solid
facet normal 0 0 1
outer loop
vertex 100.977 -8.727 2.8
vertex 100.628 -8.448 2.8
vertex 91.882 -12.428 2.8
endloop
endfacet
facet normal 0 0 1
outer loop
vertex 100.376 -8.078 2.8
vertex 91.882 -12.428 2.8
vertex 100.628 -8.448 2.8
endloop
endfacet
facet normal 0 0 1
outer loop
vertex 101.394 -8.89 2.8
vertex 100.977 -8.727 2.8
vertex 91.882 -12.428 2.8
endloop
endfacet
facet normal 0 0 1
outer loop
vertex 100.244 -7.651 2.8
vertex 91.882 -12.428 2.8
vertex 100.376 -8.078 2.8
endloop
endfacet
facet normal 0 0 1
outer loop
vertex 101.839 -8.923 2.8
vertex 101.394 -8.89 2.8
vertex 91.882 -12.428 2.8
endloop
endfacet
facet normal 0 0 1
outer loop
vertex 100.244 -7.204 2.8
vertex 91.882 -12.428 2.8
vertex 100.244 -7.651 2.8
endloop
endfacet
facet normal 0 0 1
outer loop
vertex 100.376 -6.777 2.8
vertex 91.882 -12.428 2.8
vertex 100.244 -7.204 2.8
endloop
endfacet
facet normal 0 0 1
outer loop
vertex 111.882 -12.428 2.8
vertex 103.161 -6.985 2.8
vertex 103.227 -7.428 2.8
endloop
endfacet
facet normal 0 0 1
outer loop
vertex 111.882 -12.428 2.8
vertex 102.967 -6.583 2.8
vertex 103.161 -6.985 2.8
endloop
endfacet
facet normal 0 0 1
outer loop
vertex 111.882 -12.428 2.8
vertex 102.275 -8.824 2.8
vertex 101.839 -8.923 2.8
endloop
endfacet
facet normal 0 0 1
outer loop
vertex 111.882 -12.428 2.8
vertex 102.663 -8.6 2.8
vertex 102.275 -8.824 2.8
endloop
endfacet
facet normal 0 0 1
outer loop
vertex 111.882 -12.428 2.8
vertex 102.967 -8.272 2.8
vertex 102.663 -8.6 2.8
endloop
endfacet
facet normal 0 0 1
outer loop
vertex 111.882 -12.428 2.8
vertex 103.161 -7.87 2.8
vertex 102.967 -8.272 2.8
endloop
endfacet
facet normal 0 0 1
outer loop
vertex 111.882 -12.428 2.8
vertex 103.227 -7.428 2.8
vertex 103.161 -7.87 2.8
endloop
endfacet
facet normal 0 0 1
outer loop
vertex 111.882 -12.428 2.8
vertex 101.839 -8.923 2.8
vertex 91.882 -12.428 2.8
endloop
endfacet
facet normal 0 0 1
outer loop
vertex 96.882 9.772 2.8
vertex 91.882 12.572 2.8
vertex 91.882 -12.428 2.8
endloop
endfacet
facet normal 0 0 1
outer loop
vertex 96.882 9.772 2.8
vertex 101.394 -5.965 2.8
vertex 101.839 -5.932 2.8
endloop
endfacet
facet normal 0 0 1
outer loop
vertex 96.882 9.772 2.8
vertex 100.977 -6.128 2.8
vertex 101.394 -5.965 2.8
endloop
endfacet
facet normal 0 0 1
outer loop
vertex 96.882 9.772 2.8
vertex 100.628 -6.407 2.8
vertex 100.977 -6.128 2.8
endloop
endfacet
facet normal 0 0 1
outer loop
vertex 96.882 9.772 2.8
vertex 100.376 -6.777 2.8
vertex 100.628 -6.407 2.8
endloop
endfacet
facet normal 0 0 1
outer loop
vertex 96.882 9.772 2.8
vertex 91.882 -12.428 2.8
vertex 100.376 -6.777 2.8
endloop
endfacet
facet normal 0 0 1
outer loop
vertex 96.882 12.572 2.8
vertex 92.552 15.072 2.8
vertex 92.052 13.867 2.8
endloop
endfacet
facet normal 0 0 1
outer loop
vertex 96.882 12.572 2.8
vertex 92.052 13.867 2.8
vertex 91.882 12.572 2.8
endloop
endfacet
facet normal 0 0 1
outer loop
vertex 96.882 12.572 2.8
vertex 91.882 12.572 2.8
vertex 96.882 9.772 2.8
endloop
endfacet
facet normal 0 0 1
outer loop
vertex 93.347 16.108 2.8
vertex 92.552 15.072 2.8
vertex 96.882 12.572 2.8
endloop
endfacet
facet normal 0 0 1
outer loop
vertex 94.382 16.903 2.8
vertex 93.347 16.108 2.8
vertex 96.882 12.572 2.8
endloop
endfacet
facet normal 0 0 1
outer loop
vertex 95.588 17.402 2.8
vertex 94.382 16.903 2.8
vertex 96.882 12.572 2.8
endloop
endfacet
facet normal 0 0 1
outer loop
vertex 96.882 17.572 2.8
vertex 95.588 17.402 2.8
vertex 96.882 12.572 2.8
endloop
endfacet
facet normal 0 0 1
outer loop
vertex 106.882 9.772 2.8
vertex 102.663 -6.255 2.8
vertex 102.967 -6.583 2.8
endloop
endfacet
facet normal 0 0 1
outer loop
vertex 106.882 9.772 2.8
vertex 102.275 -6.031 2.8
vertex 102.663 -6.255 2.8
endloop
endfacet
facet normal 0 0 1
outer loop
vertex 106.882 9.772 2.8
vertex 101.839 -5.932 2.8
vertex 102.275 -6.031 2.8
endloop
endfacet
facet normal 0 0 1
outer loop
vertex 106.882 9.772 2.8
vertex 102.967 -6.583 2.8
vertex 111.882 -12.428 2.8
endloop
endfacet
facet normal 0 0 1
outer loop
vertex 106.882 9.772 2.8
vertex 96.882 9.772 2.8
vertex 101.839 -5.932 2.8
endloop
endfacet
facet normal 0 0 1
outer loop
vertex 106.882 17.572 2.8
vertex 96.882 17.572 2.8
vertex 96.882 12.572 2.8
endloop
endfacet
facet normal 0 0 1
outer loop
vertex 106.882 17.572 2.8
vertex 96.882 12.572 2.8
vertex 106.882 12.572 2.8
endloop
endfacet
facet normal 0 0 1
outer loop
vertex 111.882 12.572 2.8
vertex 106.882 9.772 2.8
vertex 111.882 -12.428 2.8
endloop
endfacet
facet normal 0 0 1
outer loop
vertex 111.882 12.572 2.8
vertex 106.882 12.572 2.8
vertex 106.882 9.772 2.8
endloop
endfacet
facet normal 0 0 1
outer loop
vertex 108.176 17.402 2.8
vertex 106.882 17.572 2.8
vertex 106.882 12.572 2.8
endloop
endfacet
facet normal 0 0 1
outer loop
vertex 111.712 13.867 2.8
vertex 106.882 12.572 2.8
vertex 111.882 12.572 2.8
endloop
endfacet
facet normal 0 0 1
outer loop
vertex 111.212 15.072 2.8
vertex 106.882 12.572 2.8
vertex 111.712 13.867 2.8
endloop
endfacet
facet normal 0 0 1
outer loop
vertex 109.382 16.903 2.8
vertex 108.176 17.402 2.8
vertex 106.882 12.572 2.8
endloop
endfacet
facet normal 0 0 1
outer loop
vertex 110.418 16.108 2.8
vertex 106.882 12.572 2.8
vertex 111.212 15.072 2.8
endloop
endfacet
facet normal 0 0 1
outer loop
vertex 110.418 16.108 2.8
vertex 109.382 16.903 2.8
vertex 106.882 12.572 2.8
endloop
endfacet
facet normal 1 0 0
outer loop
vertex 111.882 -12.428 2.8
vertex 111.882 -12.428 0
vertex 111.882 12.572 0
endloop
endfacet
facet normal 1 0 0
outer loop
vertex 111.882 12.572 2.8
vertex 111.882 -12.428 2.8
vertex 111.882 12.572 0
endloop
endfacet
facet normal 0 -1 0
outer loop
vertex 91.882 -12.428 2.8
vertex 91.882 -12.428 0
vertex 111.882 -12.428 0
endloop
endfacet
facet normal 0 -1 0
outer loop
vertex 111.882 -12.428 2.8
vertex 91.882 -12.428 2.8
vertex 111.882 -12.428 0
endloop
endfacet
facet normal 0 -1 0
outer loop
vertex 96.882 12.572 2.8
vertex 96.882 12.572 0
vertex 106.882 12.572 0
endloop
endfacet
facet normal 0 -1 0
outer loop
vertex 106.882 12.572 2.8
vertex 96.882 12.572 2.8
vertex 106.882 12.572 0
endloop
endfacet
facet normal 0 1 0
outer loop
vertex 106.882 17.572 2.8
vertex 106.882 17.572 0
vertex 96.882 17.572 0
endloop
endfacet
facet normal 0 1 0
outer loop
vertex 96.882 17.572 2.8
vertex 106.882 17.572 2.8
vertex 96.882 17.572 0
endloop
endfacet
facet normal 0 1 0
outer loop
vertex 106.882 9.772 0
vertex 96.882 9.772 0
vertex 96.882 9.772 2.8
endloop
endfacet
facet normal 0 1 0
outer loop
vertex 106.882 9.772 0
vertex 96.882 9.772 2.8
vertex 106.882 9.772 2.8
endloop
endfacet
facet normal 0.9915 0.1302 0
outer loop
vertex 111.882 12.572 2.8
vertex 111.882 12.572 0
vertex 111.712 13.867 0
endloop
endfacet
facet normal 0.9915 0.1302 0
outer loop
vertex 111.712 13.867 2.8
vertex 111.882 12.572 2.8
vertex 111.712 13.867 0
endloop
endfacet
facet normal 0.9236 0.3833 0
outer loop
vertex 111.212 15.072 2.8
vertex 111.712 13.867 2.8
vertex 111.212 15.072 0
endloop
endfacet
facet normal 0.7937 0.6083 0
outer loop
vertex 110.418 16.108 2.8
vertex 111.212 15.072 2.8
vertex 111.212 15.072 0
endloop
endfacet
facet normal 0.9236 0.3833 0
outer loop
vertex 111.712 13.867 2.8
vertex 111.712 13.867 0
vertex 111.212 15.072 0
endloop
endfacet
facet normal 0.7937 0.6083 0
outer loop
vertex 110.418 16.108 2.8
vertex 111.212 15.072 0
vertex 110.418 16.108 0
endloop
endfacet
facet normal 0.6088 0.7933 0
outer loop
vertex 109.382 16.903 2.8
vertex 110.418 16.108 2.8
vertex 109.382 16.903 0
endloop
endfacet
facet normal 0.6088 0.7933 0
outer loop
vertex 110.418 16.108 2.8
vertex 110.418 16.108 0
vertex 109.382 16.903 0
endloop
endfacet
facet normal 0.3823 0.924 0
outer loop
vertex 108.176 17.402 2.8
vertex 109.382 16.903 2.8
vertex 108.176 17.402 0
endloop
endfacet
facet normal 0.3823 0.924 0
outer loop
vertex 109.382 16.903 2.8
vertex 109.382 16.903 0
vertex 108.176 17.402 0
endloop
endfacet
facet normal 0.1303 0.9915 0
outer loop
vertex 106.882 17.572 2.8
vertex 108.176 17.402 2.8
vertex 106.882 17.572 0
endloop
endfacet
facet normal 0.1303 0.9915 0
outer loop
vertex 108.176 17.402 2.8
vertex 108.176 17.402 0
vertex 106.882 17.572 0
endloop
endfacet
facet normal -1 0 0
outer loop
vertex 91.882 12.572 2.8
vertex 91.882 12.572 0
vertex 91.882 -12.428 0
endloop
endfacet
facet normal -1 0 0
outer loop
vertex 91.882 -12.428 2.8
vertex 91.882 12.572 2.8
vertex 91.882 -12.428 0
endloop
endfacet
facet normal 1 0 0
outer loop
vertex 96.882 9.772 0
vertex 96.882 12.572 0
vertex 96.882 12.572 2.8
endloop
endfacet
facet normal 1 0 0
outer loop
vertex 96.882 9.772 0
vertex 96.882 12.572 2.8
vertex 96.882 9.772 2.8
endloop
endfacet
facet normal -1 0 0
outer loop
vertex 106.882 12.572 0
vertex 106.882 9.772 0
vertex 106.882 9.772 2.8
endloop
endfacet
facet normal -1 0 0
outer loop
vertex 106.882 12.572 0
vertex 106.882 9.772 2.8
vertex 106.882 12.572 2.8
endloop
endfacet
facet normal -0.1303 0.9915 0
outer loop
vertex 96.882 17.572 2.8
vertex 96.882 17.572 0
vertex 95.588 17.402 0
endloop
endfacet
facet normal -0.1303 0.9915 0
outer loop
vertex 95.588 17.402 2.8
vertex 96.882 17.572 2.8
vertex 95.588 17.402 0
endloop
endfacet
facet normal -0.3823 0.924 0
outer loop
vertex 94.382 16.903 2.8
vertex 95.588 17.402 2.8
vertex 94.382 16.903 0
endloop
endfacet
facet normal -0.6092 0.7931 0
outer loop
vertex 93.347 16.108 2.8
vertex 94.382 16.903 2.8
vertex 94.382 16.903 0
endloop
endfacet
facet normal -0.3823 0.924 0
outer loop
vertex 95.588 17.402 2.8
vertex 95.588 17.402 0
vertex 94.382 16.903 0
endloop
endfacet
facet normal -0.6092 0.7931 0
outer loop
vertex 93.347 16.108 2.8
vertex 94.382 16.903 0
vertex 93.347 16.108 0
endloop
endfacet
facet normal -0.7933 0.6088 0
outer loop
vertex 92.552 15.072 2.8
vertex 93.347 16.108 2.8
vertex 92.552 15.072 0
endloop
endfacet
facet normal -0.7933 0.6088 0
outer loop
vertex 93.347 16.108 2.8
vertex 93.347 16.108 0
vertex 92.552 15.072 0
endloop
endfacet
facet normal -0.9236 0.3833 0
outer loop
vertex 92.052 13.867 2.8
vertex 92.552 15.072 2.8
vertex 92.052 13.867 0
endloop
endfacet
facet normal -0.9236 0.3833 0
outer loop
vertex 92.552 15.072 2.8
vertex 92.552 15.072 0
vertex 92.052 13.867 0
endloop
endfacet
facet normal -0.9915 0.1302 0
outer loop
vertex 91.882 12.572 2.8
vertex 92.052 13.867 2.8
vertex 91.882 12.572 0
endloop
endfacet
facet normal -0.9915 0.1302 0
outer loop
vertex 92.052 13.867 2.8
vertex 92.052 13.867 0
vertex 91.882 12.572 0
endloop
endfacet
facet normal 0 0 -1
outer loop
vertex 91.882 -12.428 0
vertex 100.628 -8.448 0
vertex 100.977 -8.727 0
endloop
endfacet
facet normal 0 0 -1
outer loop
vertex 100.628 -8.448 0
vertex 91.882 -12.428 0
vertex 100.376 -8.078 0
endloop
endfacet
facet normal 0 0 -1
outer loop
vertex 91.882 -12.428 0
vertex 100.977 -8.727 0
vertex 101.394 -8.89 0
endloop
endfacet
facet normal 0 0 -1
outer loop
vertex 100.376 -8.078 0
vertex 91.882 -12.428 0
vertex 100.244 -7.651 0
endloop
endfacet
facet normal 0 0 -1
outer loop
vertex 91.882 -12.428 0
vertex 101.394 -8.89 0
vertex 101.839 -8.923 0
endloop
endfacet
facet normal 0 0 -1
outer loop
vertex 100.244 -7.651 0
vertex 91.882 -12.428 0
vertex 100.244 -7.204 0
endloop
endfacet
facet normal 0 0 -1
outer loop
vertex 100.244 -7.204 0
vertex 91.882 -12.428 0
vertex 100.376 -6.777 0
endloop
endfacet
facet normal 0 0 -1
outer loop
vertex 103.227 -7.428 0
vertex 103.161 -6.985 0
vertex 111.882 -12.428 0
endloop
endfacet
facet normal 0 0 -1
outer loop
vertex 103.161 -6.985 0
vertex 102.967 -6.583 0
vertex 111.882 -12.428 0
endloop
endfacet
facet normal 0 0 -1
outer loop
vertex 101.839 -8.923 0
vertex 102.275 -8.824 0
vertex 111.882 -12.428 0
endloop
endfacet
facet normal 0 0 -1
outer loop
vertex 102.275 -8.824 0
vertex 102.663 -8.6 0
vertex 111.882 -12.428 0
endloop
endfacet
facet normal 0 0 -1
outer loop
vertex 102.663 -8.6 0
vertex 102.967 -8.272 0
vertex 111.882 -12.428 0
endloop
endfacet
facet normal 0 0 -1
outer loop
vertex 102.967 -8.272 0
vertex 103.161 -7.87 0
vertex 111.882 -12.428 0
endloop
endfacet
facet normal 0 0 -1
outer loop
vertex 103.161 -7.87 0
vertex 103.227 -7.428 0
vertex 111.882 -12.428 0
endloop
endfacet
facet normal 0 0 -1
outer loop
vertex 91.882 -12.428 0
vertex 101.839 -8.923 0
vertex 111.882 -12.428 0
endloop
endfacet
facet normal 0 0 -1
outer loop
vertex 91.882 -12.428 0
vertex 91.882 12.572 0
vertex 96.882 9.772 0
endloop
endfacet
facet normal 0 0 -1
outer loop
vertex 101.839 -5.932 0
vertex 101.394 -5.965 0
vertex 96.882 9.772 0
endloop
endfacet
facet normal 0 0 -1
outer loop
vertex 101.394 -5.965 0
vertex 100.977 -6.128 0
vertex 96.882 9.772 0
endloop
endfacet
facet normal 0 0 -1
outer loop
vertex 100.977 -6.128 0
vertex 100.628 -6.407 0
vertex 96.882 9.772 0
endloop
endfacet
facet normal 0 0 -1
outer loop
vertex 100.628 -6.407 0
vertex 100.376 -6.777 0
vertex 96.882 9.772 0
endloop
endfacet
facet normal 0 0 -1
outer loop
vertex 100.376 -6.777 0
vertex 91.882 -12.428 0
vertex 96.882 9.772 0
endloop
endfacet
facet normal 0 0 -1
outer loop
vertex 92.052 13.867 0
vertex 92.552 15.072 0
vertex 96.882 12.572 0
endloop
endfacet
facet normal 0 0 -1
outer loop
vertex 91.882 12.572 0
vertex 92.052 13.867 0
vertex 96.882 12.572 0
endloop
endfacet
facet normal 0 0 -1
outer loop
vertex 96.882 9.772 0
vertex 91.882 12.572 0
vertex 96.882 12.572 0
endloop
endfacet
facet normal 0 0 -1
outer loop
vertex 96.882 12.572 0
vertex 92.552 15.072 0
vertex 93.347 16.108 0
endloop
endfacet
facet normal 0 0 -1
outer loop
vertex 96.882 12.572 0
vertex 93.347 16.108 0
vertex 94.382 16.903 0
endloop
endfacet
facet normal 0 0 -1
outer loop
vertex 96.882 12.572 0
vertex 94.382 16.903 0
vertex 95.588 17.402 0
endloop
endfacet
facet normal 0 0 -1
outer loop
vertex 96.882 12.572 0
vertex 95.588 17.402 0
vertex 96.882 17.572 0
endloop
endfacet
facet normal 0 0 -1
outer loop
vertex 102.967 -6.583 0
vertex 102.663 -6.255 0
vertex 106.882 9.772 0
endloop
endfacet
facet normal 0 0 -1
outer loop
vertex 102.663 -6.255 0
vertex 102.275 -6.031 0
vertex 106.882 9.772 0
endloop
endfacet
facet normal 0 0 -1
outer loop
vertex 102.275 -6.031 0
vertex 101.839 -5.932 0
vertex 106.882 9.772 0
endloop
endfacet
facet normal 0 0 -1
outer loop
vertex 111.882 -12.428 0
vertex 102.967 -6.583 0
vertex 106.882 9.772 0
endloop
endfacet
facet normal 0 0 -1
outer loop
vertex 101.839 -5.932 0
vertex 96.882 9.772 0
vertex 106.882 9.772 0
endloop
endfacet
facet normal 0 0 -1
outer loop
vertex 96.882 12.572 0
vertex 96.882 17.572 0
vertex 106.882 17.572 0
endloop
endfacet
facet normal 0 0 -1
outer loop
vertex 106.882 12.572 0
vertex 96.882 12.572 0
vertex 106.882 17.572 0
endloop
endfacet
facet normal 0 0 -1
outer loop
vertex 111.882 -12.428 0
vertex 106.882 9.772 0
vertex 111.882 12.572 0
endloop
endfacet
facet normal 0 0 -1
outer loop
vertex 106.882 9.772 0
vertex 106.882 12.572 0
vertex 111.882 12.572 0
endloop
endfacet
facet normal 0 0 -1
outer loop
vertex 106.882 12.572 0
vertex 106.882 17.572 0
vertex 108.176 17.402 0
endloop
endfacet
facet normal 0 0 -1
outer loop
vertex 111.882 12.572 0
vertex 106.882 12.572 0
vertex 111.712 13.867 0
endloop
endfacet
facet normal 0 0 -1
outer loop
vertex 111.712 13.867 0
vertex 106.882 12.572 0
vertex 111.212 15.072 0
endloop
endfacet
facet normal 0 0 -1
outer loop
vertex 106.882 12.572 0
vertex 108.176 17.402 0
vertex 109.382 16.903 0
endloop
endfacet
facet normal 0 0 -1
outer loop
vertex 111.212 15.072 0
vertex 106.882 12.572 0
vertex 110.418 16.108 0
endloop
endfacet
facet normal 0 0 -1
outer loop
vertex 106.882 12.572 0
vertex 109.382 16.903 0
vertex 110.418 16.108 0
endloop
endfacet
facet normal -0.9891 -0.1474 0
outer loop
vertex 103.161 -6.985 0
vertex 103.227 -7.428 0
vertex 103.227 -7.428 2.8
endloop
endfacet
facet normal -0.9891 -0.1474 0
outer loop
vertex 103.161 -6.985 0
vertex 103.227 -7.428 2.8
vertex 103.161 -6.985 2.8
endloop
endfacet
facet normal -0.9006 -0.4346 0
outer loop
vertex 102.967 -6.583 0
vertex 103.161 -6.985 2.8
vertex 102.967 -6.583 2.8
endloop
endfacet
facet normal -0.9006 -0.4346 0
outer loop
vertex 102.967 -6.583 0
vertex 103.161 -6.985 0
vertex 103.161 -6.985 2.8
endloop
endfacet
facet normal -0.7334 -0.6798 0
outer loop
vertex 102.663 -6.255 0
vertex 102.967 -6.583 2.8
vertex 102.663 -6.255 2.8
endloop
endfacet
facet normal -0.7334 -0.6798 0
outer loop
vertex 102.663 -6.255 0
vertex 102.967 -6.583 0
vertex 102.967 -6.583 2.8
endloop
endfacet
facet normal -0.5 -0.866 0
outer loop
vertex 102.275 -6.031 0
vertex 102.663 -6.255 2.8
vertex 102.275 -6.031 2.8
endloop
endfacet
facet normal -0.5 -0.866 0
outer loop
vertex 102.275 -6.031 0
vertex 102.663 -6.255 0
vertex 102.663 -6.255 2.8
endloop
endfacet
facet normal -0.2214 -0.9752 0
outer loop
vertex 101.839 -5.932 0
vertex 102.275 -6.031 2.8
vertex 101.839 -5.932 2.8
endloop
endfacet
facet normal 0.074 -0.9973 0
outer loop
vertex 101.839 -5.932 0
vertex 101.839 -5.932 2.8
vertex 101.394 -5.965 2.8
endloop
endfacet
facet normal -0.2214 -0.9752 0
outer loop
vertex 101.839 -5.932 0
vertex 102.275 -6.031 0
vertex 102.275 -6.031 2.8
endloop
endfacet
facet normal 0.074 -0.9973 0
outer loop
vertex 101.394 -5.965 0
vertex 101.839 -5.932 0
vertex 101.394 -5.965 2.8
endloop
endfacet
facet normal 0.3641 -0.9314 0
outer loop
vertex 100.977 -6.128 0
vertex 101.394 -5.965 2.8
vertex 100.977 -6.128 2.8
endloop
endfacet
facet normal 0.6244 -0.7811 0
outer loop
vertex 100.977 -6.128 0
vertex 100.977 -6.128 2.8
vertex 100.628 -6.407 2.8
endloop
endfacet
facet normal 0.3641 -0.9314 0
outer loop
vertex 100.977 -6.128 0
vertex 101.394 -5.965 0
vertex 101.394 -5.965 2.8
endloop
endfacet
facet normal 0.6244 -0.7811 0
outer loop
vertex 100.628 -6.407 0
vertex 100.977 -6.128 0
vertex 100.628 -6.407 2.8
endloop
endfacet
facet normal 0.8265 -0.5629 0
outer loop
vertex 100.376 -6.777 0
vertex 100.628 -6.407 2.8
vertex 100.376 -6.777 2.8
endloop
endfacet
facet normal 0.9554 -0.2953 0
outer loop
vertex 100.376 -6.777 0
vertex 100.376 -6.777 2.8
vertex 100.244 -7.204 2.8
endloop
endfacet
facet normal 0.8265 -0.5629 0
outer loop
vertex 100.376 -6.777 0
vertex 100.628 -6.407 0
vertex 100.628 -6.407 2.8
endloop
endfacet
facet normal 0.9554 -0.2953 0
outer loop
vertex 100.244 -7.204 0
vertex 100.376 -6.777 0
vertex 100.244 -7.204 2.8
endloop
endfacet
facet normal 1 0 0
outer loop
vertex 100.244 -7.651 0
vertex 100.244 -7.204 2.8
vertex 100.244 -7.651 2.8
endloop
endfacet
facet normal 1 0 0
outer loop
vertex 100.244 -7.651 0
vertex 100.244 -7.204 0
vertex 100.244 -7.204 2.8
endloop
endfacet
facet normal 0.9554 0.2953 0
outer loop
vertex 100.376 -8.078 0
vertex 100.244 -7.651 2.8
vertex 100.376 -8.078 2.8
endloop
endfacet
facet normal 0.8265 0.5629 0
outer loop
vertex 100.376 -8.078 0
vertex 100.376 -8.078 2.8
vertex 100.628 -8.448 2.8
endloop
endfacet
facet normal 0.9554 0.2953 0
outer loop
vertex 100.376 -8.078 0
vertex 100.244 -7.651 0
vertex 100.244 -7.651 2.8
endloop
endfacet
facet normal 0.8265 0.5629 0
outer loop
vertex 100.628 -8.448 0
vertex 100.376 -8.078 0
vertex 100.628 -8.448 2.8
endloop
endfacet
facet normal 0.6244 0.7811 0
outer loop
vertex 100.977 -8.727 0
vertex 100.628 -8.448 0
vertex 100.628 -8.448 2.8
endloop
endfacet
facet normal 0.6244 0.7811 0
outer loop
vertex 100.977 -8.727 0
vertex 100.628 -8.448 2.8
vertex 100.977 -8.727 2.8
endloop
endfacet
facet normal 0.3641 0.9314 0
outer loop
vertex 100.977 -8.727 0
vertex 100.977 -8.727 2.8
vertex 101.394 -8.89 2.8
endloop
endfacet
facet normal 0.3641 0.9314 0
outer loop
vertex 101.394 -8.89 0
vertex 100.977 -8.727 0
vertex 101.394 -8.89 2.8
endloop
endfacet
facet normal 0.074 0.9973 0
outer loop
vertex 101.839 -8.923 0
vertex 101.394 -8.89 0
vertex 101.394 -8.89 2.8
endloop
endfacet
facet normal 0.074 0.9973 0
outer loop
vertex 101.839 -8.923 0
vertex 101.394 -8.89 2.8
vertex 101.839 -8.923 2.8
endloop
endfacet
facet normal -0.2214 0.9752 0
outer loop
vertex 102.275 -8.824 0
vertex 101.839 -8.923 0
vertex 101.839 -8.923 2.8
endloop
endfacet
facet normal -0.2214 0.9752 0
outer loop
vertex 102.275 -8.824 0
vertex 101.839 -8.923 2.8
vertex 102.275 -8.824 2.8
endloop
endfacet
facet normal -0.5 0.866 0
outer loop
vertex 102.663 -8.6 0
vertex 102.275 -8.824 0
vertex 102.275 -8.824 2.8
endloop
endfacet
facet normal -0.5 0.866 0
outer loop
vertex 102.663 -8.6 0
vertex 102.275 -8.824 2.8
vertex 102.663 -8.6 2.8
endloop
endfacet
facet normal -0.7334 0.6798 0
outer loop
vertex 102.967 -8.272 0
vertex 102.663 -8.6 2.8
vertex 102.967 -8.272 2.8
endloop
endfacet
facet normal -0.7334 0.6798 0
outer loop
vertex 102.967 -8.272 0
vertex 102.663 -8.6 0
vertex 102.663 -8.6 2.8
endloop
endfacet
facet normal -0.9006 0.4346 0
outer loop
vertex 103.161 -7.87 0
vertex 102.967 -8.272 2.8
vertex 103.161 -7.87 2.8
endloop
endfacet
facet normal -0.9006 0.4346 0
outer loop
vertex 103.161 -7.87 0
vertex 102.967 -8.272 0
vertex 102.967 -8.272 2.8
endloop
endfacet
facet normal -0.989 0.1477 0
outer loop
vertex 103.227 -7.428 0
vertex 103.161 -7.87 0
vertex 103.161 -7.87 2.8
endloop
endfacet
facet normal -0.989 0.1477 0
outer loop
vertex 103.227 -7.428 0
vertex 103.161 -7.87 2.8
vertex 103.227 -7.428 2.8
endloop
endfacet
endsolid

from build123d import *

# Parameters (mm, degrees)
MODEL_R             = 1.5
BOSS_EXTRUDE1_DEPTH = 2.8


with BuildPart() as part:
    # Model → Boss-Extrude1 (new body)
    with BuildSketch(Plane.XY):
        with BuildLine():
            Line((91.882047895, -12.427518263), (111.882047895, -12.427518263))
            Line((111.882047895, -12.427518263), (111.882047895, -2.427518263))
            Line((111.882047895, -2.427518263), (111.882047895, 12.572481737))
            ThreePointArc((111.882047895, 12.572481737), (110.417581801, 16.108015643), (106.882047895, 17.572481737))
            Line((106.882047895, 17.572481737), (96.882047895, 17.572481737))
            ThreePointArc((96.882047895, 17.572481737), (93.346513989, 16.108015643), (91.882047895, 12.572481737))
            Line((91.882047895, 12.572481737), (91.882047895, -2.427518263))
            Line((91.882047895, -2.427518263), (91.882047895, -12.427518263))
        make_face()
        with Locations((101.727306447, -7.427518263)):
            Circle(MODEL_R, mode=Mode.SUBTRACT)
        Polygon((101.882047895, 12.572481737), (96.882047895, 12.572481737), (96.882047895, 9.772481737), (106.882047895, 9.772481737), (106.882047895, 12.572481737), align=None, mode=Mode.SUBTRACT)
    extrude(amount=BOSS_EXTRUDE1_DEPTH)


solid = part.part
